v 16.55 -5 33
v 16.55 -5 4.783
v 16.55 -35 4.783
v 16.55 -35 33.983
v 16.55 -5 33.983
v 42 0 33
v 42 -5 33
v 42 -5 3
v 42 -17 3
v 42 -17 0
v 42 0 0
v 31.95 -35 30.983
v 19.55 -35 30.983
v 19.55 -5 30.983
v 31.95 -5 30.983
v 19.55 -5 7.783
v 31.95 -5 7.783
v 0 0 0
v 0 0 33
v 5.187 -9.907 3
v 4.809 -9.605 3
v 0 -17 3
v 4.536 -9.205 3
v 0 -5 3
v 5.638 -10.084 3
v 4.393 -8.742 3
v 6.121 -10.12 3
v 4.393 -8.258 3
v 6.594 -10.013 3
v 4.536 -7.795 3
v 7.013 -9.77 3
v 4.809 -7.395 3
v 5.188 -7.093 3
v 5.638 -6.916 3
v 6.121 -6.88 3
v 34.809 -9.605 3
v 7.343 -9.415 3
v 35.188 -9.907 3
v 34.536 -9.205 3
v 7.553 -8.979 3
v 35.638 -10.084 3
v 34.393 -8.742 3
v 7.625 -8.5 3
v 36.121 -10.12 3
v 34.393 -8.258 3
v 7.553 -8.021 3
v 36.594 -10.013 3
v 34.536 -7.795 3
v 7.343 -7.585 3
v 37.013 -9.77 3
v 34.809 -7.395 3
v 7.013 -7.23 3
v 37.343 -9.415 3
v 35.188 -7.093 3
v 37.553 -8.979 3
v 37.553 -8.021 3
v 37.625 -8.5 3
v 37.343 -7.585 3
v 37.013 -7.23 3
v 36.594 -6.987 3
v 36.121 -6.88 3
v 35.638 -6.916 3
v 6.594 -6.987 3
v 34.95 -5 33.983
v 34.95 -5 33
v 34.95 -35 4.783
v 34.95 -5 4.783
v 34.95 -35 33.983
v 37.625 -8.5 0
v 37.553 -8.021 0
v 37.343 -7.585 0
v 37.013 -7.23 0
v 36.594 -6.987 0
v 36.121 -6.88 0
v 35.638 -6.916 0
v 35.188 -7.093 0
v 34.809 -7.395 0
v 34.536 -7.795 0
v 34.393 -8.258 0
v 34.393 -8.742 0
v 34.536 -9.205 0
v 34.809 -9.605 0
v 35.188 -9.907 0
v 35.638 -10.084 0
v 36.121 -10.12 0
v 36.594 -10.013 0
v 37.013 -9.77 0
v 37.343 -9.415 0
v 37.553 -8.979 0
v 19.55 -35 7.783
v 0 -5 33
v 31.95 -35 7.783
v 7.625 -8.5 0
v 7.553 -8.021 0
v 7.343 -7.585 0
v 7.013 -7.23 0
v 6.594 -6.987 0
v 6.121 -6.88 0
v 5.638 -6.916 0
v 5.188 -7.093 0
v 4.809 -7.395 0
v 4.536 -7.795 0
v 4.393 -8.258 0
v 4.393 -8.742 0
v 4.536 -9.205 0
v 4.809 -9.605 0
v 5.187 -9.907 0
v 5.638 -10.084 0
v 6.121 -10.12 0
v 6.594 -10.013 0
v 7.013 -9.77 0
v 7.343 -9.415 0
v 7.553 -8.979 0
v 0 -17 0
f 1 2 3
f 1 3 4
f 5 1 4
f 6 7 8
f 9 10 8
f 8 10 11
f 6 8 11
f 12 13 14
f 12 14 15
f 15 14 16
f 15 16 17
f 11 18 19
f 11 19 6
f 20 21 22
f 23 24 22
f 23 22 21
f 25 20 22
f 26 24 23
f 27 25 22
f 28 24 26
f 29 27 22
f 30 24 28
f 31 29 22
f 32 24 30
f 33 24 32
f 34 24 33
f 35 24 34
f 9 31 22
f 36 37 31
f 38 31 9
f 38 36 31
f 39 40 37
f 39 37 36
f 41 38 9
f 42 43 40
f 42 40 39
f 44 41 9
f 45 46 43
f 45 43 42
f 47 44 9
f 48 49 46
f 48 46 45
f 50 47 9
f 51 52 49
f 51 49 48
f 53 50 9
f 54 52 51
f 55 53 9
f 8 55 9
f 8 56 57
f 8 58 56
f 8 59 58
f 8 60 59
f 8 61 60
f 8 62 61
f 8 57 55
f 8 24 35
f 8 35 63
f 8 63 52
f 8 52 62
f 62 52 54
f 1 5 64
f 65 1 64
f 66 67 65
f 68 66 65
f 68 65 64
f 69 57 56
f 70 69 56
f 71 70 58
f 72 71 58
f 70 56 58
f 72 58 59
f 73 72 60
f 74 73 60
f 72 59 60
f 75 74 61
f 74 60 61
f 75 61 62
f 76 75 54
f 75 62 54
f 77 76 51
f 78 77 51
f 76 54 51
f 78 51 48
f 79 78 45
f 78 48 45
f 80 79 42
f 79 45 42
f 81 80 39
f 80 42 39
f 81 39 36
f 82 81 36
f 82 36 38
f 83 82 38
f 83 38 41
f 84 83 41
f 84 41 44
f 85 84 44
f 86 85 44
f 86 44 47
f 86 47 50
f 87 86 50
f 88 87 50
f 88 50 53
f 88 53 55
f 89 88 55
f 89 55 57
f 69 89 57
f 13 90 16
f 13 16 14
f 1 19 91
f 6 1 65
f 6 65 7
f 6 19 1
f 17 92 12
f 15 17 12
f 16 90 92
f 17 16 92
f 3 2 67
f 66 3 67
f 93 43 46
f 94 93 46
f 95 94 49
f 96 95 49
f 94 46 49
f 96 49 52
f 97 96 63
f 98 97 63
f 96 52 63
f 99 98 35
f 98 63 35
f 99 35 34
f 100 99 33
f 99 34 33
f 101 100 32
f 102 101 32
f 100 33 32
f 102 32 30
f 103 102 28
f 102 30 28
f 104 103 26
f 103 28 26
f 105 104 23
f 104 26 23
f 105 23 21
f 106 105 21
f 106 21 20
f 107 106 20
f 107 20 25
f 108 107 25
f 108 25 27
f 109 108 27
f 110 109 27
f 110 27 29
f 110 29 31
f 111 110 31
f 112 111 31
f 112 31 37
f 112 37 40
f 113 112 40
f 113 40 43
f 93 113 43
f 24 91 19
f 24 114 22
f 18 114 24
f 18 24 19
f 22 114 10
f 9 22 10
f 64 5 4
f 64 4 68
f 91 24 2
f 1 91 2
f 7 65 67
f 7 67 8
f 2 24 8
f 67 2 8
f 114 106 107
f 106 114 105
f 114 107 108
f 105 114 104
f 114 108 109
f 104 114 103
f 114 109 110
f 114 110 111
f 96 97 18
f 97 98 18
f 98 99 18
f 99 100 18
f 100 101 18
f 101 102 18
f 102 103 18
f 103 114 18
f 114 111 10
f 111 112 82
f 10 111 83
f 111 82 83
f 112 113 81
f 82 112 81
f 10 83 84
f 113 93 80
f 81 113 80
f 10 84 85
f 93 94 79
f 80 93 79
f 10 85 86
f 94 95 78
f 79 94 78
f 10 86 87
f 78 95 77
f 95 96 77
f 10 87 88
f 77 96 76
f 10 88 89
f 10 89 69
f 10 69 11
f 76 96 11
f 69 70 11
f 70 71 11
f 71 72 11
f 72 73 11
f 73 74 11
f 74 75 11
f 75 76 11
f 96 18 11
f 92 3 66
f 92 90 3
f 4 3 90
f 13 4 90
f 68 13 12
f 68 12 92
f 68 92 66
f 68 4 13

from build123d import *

# Parameters (mm, degrees)
ESQUISSE1_W             = 42
ESQUISSE1_H             = 17
BOSS_EXTRU_1_DEPTH      = 3
ESQUISSE2_R             = 1.625
ENL_V_MAT_EXTRU_1_DEPTH = 4
ESQUISSE3_W             = 42
ESQUISSE3_H             = 5
BOSS_EXTRU_2_DEPTH      = 30
ESQUISSE4_W             = 18.4
ESQUISSE4_H             = 29.2
ESQUISSE4_W_2           = 12.4
ESQUISSE4_H_2           = 23.2
BOSS_EXTRU_3_DEPTH      = 30


with BuildPart() as part:
    # Esquisse1 → Boss.-Extru.1 (new body)
    with BuildSketch(Plane.XY):
        with Locations((21, -8.5)):
            Rectangle(ESQUISSE1_W, ESQUISSE1_H)
    extrude(amount=BOSS_EXTRU_1_DEPTH)

    # Esquisse2 → Enlèv. mat.-Extru.1 (cut, through all)
    with BuildSketch(Plane.XY.offset(3)):
        with Locations((6, -8.5)):
            Circle(ESQUISSE2_R)
        with Locations((36, -8.5)):
            Circle(ESQUISSE2_R)
    extrude(amount=-ENL_V_MAT_EXTRU_1_DEPTH, mode=Mode.SUBTRACT)

    # Esquisse3 → Boss.-Extru.2 (add)
    with BuildSketch(Plane.XY.offset(3)):
        with Locations((21, -2.5)):
            Rectangle(ESQUISSE3_W, ESQUISSE3_H)
    extrude(amount=BOSS_EXTRU_2_DEPTH)

    # Esquisse4 → Boss.-Extru.3 (add)
    with BuildSketch(Plane.XZ.offset(5)):
        with Locations((25.749828538, 19.382668745)):
            Rectangle(ESQUISSE4_W, ESQUISSE4_H)
        with Locations((25.749828538, 19.382668745)):
            Rectangle(ESQUISSE4_W_2, ESQUISSE4_H_2, mode=Mode.SUBTRACT)
    extrude(amount=BOSS_EXTRU_3_DEPTH)


solid = part.part
